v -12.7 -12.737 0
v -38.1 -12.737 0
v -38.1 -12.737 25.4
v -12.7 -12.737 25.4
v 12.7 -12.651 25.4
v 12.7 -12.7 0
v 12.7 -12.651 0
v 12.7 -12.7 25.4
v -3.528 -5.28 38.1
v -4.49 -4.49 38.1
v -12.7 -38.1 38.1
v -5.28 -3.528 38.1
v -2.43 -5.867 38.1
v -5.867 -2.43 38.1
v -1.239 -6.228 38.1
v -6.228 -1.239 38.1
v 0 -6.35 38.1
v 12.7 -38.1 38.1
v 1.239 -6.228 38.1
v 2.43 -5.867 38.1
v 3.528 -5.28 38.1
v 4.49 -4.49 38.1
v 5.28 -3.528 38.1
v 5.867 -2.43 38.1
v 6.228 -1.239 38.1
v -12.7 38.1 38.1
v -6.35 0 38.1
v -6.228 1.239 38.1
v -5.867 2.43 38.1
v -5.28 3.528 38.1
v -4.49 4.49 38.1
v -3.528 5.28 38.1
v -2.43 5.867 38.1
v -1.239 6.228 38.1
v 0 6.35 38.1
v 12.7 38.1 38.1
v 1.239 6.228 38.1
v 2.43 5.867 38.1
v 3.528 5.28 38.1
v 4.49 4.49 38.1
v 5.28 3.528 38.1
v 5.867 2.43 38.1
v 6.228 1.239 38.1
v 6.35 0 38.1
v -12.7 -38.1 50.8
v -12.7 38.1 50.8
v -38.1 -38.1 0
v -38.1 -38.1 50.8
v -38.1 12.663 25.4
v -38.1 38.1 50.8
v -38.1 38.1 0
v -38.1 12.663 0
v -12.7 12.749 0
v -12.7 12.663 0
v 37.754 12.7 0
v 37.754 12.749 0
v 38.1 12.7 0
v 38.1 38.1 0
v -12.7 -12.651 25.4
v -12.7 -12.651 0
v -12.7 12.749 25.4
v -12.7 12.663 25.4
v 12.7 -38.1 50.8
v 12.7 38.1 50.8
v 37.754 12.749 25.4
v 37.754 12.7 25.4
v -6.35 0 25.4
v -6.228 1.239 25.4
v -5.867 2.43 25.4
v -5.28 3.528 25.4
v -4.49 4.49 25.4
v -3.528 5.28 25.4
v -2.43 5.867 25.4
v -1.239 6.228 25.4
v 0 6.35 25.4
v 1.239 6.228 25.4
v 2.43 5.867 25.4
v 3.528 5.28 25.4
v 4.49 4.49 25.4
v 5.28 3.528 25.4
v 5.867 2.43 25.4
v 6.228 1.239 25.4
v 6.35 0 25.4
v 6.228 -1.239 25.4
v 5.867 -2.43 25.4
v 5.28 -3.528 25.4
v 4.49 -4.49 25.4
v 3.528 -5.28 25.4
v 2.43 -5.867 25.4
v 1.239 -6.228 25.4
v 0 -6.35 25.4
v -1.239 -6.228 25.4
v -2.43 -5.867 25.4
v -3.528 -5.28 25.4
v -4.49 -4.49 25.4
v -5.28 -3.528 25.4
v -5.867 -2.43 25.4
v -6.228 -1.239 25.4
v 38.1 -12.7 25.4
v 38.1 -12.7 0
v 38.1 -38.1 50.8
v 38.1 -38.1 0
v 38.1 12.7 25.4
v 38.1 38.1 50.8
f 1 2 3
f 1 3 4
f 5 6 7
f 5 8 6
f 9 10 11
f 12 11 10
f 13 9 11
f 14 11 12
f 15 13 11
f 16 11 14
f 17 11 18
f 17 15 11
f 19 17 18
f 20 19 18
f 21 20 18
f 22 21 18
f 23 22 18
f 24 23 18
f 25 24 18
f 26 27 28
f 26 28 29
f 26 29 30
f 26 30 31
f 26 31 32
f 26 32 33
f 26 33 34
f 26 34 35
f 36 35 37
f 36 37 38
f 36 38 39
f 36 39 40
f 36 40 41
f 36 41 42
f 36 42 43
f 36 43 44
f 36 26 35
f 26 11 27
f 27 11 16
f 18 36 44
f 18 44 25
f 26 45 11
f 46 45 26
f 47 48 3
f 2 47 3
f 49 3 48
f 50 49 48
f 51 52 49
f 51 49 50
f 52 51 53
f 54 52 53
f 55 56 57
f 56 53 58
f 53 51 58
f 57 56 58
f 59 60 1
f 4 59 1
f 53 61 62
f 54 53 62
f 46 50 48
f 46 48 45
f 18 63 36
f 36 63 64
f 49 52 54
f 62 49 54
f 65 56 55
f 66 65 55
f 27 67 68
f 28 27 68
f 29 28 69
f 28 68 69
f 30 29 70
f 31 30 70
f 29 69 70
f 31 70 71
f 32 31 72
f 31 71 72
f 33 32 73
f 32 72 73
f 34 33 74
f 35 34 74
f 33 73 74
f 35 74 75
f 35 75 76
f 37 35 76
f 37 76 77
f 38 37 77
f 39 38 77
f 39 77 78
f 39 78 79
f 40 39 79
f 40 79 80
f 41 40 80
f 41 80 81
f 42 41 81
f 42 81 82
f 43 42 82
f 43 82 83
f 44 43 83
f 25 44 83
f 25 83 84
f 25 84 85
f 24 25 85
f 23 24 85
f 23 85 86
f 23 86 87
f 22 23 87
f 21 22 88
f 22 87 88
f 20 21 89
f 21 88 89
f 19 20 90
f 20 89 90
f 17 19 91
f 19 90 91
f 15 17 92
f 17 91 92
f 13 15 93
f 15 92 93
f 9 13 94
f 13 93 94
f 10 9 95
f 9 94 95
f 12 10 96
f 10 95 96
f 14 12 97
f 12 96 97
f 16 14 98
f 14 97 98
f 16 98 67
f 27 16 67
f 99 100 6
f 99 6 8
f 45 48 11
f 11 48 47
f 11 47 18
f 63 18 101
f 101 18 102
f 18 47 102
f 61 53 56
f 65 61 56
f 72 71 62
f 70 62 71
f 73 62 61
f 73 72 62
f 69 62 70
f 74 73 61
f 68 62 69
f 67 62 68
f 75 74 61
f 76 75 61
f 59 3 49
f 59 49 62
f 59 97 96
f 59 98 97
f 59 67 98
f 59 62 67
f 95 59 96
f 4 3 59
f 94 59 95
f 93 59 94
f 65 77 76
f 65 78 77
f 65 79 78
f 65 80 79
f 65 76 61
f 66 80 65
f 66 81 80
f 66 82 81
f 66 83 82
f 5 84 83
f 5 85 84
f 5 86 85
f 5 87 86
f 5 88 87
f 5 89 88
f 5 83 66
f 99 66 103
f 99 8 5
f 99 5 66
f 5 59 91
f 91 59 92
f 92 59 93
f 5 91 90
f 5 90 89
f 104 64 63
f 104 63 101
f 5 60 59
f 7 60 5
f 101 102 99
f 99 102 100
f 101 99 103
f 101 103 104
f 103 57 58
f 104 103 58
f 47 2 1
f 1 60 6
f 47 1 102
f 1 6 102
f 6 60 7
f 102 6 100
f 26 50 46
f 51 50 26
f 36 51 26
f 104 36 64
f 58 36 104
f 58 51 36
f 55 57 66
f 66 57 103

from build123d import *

# Parameters (mm, degrees)
F0_W      = 76.2
F0_H      = 76.2
F1_DEPTH  = 50.8
F2_W      = 25.4
F2_H      = 76.2
F3_DEPTH  = 12.7
F6_W      = 26.153776
F6_H      = 25.4
F7_DEPTH  = 25.4
F5_W      = 50.453637
F5_H      = 25.4
F8_DEPTH  = 25.4
F9_W      = 25.4
F9_H      = 12.7
F10_DEPTH = 25.4
F11_W     = 25.4
F11_H     = 12.7
F12_DEPTH = 25.4
F14_D     = 12.7


with BuildPart() as f1:
    # F0 (on Top) → F1 (new body)
    with BuildSketch(Plane.XY):
        Rectangle(F0_W, F0_H)
    extrude(amount=F1_DEPTH)

    # F2 (on face) → F3 (cut)
    with BuildSketch(Plane.XY.offset(50.8)):
        Rectangle(F2_W, F2_H)
    extrude(amount=-F3_DEPTH, mode=Mode.SUBTRACT)

    # F6 (on face) → F7 (cut)
    with BuildSketch(Plane(origin=(0, 0, 0), x_dir=(1, 0, 0), z_dir=(0, 0, -1))):
        with Locations((-25.776888, 0.036548)):
            Rectangle(F6_W, F6_H)
    extrude(amount=-F7_DEPTH, mode=Mode.SUBTRACT)

    # F5 (on face) → F8 (cut)
    with BuildSketch(Plane(origin=(0, 0, 0), x_dir=(1, 0, 0), z_dir=(0, 0, -1))):
        with Locations((12.526818, -0.04948)):
            Rectangle(F5_W, F5_H)
    extrude(amount=-F8_DEPTH, mode=Mode.SUBTRACT)

    # F9 (on face) → F10 (cut)
    with BuildSketch(Plane.YZ.offset(38.1)):
        with Locations((0, 6.35)):
            Rectangle(F9_W, F9_H)
    extrude(amount=-F10_DEPTH, mode=Mode.SUBTRACT)

    # F11 (on face) → F12 (cut)
    with BuildSketch(Plane.YZ.offset(38.1)):
        with Locations((0, 19.05)):
            Rectangle(F11_W, F11_H)
    extrude(amount=-F12_DEPTH, mode=Mode.SUBTRACT)

    # F14 (through all)
    with Locations(Plane.XY.offset(38.1)):
        with Locations((0, 0)):
            Hole(F14_D / 2)


solid = f1.part
